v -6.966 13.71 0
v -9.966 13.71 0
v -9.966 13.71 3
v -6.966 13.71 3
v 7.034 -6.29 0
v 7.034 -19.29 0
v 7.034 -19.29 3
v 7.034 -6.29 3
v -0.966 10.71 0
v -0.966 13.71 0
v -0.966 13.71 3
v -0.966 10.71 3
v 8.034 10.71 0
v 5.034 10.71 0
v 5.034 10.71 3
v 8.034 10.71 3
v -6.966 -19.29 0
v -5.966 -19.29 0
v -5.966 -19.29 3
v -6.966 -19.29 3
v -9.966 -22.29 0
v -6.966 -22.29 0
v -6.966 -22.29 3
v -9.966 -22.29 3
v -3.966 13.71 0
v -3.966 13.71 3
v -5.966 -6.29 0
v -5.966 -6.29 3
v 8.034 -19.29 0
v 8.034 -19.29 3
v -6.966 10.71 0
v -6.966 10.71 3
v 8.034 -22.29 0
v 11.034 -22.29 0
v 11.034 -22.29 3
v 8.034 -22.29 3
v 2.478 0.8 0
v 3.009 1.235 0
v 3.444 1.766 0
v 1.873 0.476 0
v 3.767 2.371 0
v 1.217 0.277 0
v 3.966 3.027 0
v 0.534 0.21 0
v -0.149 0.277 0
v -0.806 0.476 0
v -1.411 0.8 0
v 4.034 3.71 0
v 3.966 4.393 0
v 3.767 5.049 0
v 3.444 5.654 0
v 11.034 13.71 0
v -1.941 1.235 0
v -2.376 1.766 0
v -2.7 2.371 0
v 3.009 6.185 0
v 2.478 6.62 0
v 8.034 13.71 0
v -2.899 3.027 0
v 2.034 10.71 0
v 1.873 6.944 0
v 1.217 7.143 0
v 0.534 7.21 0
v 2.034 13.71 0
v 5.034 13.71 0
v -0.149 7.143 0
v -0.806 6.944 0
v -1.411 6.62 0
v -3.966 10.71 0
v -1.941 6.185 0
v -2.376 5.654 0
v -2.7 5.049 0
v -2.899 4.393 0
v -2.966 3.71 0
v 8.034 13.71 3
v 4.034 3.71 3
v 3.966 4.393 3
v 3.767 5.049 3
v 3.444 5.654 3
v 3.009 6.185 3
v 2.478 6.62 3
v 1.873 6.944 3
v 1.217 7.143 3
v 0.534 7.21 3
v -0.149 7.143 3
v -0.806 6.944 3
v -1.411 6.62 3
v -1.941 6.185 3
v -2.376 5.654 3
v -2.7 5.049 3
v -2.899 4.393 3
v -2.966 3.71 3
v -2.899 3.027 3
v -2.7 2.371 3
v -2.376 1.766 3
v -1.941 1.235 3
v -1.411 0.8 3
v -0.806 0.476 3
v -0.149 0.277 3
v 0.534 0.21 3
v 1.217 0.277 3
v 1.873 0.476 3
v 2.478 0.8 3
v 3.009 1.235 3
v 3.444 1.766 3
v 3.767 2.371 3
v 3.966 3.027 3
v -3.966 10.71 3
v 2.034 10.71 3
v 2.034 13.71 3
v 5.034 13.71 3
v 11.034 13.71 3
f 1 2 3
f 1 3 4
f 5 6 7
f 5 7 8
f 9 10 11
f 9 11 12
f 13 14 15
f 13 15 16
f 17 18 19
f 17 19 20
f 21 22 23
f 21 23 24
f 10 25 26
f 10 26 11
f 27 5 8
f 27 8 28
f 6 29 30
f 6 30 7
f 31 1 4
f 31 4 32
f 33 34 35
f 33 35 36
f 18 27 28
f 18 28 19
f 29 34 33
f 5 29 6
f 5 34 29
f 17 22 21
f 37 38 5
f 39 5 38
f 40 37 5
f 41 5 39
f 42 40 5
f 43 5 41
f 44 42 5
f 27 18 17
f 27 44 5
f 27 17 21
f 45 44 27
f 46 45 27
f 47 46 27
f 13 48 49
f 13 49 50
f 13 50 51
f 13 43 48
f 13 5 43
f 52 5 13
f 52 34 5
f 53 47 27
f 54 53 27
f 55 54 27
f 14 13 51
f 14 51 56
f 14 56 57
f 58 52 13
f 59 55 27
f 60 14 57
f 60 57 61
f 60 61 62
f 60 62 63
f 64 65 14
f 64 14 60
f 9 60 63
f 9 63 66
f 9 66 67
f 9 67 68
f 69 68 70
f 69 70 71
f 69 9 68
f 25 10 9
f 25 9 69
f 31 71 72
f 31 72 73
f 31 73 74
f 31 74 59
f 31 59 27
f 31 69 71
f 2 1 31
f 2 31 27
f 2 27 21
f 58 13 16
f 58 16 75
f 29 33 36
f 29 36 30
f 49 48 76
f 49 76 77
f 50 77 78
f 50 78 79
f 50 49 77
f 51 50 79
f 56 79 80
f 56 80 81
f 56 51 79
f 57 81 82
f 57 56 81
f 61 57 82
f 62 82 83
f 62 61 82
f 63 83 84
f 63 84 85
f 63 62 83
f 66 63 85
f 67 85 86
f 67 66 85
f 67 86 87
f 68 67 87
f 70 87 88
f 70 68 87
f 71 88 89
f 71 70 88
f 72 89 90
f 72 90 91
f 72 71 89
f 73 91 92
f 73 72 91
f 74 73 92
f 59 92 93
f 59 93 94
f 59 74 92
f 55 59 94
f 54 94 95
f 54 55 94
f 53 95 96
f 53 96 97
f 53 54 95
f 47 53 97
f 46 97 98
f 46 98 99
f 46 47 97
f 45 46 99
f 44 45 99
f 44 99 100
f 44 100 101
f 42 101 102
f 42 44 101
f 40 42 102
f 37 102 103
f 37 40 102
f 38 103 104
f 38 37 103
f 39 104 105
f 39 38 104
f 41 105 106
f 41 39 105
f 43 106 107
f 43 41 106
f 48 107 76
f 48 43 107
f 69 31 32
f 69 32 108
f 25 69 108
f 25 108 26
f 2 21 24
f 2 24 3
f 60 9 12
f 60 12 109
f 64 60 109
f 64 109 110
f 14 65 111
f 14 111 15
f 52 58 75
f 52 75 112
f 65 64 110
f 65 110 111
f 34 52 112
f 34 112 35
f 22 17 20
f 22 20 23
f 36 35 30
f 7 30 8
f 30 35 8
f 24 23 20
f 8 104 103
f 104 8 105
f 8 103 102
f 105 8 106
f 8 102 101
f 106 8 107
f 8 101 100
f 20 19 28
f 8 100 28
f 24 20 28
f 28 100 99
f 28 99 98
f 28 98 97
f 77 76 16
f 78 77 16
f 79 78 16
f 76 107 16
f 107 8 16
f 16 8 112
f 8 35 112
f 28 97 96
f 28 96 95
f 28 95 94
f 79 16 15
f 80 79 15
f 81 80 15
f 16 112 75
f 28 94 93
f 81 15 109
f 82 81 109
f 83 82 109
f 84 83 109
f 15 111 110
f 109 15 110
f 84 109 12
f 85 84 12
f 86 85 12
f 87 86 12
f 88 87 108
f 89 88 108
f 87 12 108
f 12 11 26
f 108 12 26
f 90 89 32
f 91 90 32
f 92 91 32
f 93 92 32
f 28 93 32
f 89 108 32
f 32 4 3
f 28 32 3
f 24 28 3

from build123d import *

# Parameters (mm, degrees)
SKETCH2_R           = 3.5
BOSS_EXTRUDE1_DEPTH = 3


with BuildPart() as part:
    # Sketch2 → Boss-Extrude1 (new body)
    with BuildSketch(Plane.XY):
        Polygon((-9.966299499, 13.71), (-6.966299499, 13.71), (-6.966299499, 10.71), (-3.966299499, 10.71), (-3.966299499, 13.71), (-0.966299499, 13.71), (-0.966299499, 10.71), (2.033700501, 10.71), (2.033700501, 13.71), (5.033700501, 13.71), (5.033700501, 10.71), (8.033700501, 10.71), (8.033700501, 13.71), (11.033700501, 13.71), (11.033700501, -22.29), (8.033700501, -22.29), (8.033700501, -19.29), (7.033700501, -19.29), (7.033700501, -6.29), (-5.966299499, -6.29), (-5.966299499, -19.29), (-6.966299499, -19.29), (-6.966299499, -22.29), (-9.966299499, -22.29), align=None)
        with Locations((0.533700501, 3.71)):
            Circle(SKETCH2_R, mode=Mode.SUBTRACT)
    extrude(amount=BOSS_EXTRUDE1_DEPTH)


solid = part.part
